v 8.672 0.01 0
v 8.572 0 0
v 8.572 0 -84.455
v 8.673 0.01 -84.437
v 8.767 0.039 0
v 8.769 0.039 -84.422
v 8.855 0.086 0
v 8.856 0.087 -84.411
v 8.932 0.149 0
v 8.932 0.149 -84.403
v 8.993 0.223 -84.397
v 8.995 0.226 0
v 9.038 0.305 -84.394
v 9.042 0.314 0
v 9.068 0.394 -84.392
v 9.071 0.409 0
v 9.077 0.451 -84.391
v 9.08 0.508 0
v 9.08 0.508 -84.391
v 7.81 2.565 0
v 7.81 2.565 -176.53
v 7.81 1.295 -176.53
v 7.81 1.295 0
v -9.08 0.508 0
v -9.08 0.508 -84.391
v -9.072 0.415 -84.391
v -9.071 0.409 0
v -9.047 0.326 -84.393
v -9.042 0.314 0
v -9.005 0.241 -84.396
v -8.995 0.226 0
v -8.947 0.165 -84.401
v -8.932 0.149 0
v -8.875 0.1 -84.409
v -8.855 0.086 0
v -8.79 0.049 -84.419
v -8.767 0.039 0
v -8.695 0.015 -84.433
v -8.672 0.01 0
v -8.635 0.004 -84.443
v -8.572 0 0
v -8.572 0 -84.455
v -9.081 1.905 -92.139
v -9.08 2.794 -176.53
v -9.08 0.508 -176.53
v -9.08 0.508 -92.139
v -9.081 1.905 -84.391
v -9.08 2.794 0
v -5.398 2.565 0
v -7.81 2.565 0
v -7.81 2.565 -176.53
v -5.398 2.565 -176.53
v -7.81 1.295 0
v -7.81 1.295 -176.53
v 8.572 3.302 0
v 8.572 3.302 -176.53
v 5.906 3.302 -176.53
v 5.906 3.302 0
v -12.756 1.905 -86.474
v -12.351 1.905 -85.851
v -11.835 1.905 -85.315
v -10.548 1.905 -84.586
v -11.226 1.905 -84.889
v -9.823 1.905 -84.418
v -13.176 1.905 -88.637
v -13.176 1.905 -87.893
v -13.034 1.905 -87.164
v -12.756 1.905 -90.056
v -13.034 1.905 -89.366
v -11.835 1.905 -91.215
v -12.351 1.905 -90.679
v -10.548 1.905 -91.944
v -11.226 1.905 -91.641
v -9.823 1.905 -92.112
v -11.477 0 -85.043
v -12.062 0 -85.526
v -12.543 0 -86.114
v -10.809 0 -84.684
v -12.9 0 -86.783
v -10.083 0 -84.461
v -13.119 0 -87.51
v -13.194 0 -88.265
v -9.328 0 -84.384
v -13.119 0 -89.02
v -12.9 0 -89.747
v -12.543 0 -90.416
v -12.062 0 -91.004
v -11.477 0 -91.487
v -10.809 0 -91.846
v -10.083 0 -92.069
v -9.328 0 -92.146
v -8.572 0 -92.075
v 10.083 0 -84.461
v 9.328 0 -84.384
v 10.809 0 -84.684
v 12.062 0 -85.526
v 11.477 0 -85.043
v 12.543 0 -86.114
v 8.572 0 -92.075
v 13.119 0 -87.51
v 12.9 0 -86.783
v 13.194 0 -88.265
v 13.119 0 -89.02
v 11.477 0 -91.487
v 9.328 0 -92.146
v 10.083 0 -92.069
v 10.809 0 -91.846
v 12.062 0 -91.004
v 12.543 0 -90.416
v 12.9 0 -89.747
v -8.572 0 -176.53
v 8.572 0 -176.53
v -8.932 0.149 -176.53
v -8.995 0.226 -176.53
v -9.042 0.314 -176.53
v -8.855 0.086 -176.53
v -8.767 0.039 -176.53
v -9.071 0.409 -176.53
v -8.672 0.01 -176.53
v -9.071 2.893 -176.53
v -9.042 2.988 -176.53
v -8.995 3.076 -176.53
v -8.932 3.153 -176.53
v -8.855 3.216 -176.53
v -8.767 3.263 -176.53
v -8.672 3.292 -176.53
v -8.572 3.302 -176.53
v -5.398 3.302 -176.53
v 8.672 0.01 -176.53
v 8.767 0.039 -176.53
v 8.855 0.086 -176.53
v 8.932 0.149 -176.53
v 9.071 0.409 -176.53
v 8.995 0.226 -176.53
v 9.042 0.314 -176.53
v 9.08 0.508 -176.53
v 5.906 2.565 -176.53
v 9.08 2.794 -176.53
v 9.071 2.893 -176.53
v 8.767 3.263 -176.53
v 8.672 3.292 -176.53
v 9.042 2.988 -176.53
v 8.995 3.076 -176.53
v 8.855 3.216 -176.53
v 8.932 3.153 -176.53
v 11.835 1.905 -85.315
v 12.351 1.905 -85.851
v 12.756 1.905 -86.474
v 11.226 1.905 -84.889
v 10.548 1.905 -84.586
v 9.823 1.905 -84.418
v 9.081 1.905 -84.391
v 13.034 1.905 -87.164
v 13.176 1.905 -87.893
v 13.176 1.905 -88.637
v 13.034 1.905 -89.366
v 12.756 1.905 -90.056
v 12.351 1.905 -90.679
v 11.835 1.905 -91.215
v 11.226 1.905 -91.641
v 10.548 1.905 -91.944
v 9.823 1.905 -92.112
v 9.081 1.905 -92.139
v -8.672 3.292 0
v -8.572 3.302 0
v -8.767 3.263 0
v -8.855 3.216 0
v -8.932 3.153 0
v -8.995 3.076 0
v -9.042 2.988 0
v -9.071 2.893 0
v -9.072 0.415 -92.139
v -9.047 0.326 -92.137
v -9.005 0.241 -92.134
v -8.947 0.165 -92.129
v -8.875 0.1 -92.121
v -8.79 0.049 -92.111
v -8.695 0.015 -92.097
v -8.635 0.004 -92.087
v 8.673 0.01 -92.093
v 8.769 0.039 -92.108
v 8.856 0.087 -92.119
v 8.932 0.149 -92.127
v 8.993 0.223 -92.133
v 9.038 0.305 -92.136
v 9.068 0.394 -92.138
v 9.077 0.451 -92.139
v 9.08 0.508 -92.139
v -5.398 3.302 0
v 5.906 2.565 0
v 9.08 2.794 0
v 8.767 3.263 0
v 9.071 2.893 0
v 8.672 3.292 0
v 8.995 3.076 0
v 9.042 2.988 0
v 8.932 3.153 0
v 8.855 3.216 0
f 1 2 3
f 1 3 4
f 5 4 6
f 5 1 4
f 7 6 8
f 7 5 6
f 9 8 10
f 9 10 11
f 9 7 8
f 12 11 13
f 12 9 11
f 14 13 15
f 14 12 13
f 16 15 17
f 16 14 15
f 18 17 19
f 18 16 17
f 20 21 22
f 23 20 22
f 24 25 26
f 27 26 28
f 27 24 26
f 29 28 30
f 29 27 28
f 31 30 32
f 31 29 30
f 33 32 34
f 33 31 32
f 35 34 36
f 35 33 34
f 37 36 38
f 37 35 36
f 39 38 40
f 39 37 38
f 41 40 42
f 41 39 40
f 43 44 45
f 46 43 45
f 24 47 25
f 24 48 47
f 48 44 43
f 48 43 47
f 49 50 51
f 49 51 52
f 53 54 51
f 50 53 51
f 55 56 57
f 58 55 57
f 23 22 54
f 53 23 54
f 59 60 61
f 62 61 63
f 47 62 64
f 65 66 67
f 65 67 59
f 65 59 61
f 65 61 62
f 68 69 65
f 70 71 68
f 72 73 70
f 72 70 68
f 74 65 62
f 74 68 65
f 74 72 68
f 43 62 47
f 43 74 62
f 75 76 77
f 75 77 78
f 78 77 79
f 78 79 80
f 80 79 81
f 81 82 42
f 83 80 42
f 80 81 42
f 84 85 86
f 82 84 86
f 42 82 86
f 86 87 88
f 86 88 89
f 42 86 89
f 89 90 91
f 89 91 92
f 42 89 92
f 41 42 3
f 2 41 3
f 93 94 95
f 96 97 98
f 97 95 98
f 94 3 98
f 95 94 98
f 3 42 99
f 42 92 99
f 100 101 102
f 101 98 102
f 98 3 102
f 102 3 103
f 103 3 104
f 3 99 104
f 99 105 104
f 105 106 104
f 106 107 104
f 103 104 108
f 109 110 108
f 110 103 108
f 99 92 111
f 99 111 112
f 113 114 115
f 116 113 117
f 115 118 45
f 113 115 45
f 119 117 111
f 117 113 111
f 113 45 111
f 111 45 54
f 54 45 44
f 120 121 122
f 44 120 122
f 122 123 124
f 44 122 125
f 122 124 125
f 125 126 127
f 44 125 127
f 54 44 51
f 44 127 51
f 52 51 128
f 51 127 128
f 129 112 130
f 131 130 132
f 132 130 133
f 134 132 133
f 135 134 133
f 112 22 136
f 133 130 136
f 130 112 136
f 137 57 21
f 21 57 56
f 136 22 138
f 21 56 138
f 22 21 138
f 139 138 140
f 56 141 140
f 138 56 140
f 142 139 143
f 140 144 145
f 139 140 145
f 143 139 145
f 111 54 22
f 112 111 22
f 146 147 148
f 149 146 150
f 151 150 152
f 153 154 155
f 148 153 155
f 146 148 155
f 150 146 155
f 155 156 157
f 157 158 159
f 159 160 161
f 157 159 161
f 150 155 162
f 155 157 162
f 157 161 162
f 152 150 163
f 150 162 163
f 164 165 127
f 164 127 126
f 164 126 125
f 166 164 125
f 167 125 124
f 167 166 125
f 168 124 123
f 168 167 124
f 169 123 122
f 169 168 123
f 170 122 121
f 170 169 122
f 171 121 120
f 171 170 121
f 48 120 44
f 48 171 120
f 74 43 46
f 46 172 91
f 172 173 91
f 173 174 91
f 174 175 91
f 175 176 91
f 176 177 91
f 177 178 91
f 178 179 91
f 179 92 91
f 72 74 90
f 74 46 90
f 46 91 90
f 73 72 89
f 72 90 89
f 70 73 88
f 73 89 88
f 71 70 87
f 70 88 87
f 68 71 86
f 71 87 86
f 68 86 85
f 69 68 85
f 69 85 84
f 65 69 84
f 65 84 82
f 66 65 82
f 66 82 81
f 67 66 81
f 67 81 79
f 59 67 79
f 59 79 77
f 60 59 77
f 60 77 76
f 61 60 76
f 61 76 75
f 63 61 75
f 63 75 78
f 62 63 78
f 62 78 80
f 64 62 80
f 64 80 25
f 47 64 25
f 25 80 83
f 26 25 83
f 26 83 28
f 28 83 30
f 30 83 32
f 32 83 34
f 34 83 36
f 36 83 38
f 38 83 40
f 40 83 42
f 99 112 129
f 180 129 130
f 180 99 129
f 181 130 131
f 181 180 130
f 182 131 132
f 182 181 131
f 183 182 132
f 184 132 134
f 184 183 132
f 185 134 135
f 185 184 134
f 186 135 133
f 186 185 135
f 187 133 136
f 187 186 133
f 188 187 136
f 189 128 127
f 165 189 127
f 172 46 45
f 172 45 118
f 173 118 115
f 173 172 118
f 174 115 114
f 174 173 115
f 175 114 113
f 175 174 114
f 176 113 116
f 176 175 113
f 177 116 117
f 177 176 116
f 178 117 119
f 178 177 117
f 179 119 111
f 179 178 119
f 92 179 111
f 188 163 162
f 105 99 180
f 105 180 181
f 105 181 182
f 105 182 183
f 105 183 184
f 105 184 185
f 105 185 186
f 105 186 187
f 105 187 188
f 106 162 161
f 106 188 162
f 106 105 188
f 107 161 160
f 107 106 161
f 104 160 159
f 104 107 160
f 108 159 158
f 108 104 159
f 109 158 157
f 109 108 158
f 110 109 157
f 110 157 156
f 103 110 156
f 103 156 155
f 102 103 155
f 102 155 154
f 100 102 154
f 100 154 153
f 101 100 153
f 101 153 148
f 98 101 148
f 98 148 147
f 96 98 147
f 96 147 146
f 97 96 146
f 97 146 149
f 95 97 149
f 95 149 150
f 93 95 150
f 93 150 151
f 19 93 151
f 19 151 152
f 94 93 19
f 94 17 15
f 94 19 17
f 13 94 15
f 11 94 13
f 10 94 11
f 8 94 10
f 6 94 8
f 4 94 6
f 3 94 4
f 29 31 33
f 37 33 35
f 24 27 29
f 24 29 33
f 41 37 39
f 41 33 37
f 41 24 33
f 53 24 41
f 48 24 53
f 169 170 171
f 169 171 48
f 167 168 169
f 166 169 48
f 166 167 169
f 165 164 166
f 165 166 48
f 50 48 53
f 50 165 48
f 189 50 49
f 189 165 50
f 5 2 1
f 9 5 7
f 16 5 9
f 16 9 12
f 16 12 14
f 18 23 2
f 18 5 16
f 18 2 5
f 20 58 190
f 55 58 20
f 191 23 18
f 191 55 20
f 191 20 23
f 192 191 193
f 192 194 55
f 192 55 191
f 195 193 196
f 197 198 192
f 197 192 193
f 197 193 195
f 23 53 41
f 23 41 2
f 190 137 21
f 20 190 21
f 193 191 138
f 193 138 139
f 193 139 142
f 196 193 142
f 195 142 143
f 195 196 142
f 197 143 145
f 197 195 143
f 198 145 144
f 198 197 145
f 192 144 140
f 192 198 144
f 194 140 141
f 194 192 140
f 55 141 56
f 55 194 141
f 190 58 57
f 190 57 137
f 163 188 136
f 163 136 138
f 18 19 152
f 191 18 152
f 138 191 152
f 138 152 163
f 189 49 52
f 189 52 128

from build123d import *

# Parameters (mm, degrees)
BOSS_EXTRUDE1_DEPTH = 176.53
BOSS_EXTRUDE2_DEPTH = 1.905


with BuildPart() as part:
    # Sketch2 → Boss-Extrude1 (new body)
    with BuildSketch(Plane.XY):
        with BuildLine():
            Line((-8.5725, 0), (8.5725, 0))
            ThreePointArc((8.5725, 0), (8.931710245, 0.148789755), (9.0805, 0.508))
            Line((9.0805, 0.508), (9.0805, 2.794))
            ThreePointArc((9.0805, 2.794), (8.931710245, 3.153210245), (8.5725, 3.302))
            Line((8.5725, 3.302), (5.9055, 3.302))
            Line((5.9055, 3.302), (5.9055, 2.5654))
            Line((5.9055, 2.5654), (7.8105, 2.5654))
            Line((7.8105, 2.5654), (7.8105, 1.2954))
            Line((7.8105, 1.2954), (-7.8105, 1.2954))
            Line((-7.8105, 1.2954), (-7.8105, 2.5654))
            Line((-7.8105, 2.5654), (-5.3975, 2.5654))
            Line((-5.3975, 2.5654), (-5.3975, 3.302))
            Line((-5.3975, 3.302), (-8.5725, 3.302))
            ThreePointArc((-8.5725, 3.302), (-8.931710245, 3.153210245), (-9.0805, 2.794))
            Line((-9.0805, 2.794), (-9.0805, 0.508))
            ThreePointArc((-9.0805, 0.508), (-8.931710245, 0.148789755), (-8.5725, 0))
        make_face()
    extrude(amount=-BOSS_EXTRUDE1_DEPTH)

    # Sketch3 → Boss-Extrude2 (add)
    with BuildSketch(Plane(origin=(0, 0, 0), x_dir=(1, 0, 0), z_dir=(0, 1, 0))):
        with BuildLine():
            Line((8.5725, 84.455), (8.5725, 92.075))
            ThreePointArc((8.5725, 92.075), (13.193617406, 88.265), (8.5725, 84.455))
        make_face()
    boss_extrude2 = extrude(amount=BOSS_EXTRUDE2_DEPTH)

    # Mirror1: Boss-Extrude2 across plane
    add(boss_extrude2.mirror(Plane(origin=(0, 0, 0), x_dir=(0, 0, 1), z_dir=(1, 0, 0))))


solid = part.part
